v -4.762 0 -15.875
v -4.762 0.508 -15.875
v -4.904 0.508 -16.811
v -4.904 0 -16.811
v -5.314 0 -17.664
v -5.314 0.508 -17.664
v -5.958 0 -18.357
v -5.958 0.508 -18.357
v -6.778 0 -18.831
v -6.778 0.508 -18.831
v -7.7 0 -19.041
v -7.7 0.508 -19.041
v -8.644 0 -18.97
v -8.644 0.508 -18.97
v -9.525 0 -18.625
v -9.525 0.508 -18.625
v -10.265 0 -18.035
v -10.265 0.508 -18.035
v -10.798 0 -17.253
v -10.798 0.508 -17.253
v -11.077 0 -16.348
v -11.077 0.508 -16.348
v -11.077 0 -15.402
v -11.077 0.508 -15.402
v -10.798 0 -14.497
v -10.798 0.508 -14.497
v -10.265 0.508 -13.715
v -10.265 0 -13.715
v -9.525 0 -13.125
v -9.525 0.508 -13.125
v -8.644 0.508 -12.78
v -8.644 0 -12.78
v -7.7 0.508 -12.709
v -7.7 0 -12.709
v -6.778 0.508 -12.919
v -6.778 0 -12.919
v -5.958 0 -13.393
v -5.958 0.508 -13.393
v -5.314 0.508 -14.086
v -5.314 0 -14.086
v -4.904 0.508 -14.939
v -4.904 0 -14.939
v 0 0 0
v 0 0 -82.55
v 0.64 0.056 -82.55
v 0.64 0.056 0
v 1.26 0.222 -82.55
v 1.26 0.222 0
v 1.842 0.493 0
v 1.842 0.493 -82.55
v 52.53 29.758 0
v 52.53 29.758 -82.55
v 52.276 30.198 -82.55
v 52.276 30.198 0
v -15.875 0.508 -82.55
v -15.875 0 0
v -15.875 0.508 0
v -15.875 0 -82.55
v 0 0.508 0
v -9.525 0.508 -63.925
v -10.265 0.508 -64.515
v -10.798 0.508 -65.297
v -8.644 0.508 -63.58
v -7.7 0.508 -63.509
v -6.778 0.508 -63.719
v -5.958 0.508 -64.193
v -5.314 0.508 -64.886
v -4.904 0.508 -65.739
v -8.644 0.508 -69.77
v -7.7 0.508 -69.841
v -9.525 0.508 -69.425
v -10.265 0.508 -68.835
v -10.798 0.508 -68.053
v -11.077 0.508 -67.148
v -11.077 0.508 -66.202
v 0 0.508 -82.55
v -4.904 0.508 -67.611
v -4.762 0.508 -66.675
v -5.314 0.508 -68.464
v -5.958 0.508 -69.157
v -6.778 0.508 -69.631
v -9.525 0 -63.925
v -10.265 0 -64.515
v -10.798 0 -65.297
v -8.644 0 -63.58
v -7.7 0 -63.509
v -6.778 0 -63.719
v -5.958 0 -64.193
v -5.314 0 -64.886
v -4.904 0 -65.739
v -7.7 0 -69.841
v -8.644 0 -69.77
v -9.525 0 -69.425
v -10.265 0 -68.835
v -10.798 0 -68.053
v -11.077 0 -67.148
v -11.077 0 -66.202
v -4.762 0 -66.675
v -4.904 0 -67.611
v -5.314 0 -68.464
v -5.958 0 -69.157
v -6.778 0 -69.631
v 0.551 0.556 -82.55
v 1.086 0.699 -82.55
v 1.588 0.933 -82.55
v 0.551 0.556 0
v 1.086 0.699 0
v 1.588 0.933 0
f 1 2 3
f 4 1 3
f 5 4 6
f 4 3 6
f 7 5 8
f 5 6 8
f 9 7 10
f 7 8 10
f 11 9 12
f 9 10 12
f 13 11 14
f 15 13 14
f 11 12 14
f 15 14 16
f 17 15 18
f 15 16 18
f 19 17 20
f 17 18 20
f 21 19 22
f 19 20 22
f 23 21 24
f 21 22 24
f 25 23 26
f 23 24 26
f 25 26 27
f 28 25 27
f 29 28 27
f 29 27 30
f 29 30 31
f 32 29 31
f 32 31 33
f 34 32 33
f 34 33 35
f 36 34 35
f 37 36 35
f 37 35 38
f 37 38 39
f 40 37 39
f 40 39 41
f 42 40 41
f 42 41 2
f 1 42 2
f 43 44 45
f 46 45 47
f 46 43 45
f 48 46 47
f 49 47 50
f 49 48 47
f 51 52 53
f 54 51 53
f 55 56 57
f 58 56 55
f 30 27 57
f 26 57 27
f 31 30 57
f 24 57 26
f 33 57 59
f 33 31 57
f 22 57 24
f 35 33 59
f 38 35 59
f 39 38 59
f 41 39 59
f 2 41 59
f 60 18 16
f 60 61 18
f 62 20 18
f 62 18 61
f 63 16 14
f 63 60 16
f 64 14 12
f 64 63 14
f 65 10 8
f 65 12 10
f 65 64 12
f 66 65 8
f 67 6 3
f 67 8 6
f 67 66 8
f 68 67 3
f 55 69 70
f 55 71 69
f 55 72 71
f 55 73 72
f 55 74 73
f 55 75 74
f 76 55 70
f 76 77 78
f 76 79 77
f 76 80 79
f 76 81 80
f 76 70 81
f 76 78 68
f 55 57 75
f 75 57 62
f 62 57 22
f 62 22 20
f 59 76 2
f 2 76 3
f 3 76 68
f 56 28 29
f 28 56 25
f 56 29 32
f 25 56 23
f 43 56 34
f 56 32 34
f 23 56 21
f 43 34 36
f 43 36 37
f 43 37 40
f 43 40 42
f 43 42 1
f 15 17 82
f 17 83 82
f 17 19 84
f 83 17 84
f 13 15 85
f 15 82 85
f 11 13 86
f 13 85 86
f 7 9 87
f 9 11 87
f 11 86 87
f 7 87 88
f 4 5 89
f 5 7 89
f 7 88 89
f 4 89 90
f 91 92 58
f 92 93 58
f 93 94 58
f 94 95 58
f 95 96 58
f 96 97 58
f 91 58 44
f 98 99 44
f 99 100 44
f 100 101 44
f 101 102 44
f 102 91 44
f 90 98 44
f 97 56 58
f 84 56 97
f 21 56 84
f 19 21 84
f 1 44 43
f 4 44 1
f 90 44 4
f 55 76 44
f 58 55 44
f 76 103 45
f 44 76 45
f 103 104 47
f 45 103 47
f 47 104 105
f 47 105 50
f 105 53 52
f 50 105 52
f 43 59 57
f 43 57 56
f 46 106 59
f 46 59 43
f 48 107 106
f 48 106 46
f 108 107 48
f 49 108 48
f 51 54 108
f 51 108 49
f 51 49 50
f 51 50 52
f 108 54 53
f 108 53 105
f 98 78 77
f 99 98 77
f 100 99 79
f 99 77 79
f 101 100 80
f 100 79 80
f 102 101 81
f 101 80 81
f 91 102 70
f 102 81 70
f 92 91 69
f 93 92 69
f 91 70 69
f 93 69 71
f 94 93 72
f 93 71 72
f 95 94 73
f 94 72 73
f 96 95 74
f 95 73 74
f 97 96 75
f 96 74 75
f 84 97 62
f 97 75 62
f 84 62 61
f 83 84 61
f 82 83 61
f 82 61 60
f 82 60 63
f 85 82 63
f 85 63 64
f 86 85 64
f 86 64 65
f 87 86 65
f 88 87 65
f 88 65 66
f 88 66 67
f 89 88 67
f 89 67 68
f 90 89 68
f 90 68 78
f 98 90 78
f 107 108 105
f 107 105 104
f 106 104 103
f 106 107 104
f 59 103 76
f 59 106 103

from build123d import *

# Parameters (mm, degrees)
SKETCH2_W                   = 15.875
SKETCH2_H                   = 82.55
BOSS_EXTRUDE2_DEPTH         = 0.508
EDGE_FLANGE2_DEPTH          = 82.55
F_1_4_0_25_DIAMETER_HOLE1_D = 6.35


# Sheet-metal steps are written as plain solids
with BuildPart() as part:
    # Sketch2 → Boss-Extrude2 (new body)
    with BuildSketch(Plane(origin=(0, 0, 0), x_dir=(1, 0, 0), z_dir=(0, 1, 0))):
        with Locations((-7.9375, 41.275)):
            Rectangle(SKETCH2_W, SKETCH2_H)
    extrude(amount=BOSS_EXTRUDE2_DEPTH)

    # Edge-Flange2 section (across the edge) → Edge-Flange2 (add)
    with BuildSketch(Plane(origin=(0.850738686, 0.508, 0), x_dir=(-0.49999999999999495, 0.8660254037844416, 0), z_dir=(0, 0, -1))):
        with BuildLine():
            Line((-0.508, 0.850738686), (-0.508, 59.380374))
            Line((-0.508, 59.380374), (0, 59.380374))
            Line((0, 59.380374), (0, 0.850738686))
            ThreePointArc((0, 0.850738686), (0.108185502, 0.028988218), (0.425369343, -0.736761314))
            Line((0.425369343, -0.736761314), (-0.014571562, -0.990761314))
            ThreePointArc((-0.014571562, -0.990761314), (-0.382504818, -0.102491857), (-0.508, 0.850738686))
        make_face()
    extrude(amount=EDGE_FLANGE2_DEPTH)

    # 1/4 (0.25) Diameter Hole1 (through all)
    with Locations(Plane(origin=(0, 0, 0), x_dir=(-1, 0, 0), z_dir=(0, -1, 0))):
        with Locations((7.9375, 15.875), (7.9375, 66.675)):
            Hole(F_1_4_0_25_DIAMETER_HOLE1_D / 2)


solid = part.part
